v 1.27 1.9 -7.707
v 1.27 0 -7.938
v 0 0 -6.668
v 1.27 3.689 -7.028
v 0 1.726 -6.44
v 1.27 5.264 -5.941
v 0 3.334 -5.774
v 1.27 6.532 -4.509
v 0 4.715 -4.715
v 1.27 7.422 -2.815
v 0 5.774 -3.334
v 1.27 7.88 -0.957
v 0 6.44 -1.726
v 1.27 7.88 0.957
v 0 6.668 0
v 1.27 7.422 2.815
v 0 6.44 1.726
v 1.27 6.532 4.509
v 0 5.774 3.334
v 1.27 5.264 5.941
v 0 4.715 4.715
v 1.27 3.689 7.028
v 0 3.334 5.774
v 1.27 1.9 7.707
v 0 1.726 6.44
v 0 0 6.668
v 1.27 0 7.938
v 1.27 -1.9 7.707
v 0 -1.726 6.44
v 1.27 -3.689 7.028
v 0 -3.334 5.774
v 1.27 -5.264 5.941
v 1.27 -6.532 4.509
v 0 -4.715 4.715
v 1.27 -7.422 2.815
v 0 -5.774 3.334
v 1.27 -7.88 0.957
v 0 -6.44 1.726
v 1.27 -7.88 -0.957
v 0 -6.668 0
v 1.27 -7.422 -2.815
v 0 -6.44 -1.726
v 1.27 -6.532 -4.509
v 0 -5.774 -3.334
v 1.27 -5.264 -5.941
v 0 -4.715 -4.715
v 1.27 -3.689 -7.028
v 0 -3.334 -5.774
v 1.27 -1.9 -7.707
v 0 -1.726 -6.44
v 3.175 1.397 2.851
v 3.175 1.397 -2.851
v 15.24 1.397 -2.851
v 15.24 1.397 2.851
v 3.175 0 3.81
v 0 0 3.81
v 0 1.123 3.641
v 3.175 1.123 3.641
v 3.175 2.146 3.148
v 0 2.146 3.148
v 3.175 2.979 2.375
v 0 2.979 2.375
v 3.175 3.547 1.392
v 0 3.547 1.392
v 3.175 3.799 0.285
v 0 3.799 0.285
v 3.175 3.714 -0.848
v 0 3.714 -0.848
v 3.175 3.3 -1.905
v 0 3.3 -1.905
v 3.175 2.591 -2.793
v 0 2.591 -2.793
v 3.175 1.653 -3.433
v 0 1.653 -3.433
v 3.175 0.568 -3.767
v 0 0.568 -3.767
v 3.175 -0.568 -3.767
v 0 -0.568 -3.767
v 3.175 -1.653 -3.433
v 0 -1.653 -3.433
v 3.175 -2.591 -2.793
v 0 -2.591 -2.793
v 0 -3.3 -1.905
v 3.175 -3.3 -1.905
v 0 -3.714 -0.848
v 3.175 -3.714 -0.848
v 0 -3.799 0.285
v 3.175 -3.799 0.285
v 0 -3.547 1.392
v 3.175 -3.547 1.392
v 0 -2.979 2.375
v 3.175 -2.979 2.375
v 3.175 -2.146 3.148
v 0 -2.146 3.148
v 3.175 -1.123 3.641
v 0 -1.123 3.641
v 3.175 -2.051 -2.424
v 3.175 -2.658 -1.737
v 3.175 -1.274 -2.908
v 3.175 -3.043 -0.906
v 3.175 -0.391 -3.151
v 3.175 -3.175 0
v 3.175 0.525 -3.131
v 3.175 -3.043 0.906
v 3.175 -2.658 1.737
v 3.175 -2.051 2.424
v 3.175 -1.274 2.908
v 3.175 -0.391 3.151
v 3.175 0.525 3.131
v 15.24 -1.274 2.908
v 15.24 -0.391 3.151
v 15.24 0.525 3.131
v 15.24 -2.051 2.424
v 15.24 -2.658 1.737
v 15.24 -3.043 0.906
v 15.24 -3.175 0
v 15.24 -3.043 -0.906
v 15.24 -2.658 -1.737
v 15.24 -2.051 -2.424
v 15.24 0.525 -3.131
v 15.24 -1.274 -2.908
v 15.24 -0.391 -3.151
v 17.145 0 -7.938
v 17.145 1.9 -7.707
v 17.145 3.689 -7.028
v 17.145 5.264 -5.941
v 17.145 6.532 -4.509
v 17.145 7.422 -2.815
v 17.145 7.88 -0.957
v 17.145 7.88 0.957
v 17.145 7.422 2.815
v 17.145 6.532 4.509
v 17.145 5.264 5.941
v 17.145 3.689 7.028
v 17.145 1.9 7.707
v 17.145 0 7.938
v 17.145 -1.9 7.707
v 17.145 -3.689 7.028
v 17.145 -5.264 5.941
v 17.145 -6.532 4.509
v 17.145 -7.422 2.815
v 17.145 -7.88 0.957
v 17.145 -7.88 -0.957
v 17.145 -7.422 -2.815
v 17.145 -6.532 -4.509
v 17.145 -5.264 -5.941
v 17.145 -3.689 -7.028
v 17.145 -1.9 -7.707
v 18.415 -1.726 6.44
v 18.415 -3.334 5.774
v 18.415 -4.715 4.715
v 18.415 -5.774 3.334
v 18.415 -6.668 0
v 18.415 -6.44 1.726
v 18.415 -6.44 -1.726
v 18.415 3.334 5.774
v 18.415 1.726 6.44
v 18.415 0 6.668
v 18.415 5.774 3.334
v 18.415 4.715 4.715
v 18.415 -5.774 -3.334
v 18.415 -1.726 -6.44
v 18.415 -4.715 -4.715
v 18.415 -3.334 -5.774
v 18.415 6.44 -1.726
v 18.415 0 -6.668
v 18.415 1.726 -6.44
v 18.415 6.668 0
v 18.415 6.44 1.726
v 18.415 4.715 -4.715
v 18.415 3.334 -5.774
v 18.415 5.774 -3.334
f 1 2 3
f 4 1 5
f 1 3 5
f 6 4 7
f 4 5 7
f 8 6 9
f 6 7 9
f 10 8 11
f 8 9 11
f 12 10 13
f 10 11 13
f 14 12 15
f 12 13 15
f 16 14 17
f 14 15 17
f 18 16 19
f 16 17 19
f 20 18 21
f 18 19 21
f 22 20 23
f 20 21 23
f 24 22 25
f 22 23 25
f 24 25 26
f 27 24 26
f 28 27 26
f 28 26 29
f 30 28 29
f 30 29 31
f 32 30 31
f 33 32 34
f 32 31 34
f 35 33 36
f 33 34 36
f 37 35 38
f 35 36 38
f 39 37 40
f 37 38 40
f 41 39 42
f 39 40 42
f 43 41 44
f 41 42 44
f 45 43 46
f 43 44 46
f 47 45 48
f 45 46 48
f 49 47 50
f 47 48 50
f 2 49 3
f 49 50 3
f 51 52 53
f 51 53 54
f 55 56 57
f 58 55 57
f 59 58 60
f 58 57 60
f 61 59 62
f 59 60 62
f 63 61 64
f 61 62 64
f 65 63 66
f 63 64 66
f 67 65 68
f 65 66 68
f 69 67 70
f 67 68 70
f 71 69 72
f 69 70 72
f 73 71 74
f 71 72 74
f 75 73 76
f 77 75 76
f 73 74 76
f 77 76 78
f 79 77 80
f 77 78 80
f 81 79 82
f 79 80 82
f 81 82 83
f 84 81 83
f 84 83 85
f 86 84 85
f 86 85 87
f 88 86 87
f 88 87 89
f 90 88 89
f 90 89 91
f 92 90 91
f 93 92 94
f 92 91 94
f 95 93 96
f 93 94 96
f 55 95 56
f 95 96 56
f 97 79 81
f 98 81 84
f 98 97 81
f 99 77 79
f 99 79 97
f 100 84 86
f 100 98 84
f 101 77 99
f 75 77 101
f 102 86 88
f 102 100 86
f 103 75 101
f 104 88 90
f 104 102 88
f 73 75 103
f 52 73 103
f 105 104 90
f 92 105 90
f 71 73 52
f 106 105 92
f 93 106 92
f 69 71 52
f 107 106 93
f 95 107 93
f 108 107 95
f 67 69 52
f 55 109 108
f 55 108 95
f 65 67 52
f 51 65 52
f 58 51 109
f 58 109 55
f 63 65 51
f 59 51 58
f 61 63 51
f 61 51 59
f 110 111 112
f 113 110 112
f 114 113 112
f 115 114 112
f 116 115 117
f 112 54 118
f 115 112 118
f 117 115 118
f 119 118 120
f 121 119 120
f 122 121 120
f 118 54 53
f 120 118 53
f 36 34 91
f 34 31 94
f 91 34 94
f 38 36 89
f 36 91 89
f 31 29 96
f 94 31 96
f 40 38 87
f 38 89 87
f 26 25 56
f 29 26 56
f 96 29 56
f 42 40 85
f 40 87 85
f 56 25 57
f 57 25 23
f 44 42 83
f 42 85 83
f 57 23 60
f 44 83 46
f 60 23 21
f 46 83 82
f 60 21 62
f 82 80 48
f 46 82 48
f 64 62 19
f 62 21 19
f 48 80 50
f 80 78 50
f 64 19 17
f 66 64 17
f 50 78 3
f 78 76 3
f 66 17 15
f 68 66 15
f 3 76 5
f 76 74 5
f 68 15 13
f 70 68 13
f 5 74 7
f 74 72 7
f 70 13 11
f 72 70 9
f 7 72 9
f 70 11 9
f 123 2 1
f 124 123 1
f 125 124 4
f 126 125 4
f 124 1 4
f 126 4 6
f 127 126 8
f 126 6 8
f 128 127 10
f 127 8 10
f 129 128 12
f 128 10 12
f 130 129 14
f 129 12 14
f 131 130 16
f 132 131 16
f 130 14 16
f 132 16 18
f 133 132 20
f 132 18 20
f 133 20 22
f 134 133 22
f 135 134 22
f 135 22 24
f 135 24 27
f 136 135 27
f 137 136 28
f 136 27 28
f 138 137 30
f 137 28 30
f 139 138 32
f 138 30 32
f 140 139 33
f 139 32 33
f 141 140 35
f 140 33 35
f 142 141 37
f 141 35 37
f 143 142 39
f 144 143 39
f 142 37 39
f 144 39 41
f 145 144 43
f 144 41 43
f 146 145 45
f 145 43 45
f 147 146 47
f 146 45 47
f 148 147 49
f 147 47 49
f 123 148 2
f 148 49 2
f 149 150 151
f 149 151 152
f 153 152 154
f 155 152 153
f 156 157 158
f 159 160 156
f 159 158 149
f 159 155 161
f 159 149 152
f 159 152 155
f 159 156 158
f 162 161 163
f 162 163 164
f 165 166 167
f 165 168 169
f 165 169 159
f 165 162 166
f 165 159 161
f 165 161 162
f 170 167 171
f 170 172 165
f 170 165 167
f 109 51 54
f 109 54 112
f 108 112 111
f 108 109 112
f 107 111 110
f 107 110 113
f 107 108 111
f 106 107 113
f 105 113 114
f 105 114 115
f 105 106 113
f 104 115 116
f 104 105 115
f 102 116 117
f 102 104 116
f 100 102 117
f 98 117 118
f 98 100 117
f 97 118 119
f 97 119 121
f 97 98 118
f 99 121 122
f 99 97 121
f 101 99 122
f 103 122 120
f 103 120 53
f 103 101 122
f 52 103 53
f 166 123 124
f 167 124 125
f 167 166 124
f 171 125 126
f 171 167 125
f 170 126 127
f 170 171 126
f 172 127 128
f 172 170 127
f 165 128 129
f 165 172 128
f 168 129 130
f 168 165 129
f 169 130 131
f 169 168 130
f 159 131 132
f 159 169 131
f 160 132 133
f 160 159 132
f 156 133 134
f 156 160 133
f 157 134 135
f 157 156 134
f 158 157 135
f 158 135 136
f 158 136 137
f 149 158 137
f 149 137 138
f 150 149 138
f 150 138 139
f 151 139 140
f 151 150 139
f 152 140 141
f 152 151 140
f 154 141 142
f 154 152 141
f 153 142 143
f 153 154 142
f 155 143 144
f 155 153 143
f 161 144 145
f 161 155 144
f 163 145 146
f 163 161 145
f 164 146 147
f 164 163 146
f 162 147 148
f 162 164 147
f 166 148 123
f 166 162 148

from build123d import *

# Parameters (mm, degrees)
SKETCH2_R           = 7.9375
BOSS_EXTRUDE1_DEPTH = 18.415
CHAMFER1_SIZE       = 1.27
CUT_EXTRUDE2_DEPTH  = 15.24
SKETCH5_R           = 3.81
CUT_EXTRUDE3_DEPTH  = 3.175


with BuildPart() as part:
    # Sketch2 → Boss-Extrude1 (new body)
    with BuildSketch(Plane(origin=(0, 0, 0), x_dir=(0, 0, -1), z_dir=(1, 0, 0))):
        Circle(SKETCH2_R)
    extrude(amount=BOSS_EXTRUDE1_DEPTH)

    # Chamfer1
    chamfer1_edges = [part.edges().sort_by_distance(p)[0] for p in [
        (0, 0, 7.9375),
        (18.415, 0, 7.9375),
    ]]
    chamfer(chamfer1_edges, length=CHAMFER1_SIZE)

    # Sketch4 → Cut-Extrude2 (cut)
    with BuildSketch(Plane.ZY):
        with BuildLine():
            Line((-2.851142929, 1.397), (2.851142929, 1.397))
            ThreePointArc((2.851142929, 1.397), (0, -3.175), (-2.851142929, 1.397))
        make_face()
    extrude(amount=-CUT_EXTRUDE2_DEPTH, mode=Mode.SUBTRACT)

    # Sketch5 → Cut-Extrude3 (cut)
    with BuildSketch(Plane.ZY):
        Circle(SKETCH5_R)
    extrude(amount=-CUT_EXTRUDE3_DEPTH, mode=Mode.SUBTRACT)


solid = part.part
